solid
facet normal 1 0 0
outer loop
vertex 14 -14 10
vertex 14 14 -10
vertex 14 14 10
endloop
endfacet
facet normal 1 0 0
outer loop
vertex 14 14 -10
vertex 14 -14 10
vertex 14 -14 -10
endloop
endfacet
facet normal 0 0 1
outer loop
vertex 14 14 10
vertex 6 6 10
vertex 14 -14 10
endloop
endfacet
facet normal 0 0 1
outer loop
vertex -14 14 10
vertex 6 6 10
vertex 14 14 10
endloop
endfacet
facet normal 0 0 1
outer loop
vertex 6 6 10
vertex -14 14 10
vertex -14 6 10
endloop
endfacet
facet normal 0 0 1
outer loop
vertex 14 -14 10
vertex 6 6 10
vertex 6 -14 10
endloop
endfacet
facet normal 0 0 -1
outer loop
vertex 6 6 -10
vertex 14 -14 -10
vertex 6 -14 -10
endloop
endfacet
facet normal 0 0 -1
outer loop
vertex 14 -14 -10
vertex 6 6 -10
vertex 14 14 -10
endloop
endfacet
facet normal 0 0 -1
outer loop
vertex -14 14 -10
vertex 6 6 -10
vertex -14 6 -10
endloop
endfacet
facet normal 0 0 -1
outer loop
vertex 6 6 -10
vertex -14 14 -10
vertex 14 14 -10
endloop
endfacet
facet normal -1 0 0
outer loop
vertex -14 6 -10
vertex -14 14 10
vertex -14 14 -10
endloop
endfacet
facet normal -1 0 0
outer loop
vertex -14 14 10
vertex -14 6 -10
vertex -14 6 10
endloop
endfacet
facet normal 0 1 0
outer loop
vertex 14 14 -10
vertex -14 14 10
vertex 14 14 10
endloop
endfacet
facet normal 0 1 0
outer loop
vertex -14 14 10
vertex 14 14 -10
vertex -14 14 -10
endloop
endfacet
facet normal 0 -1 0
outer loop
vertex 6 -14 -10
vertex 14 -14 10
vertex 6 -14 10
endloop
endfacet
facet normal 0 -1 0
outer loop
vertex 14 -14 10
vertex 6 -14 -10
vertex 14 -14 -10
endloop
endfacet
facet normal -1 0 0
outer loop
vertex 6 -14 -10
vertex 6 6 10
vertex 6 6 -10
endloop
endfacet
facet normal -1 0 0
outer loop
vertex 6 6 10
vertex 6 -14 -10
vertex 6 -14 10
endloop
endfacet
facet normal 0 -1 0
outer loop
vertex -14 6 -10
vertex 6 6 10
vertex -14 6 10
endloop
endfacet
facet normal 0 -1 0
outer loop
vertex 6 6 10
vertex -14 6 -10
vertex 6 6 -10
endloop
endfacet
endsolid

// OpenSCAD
module extrusion_bracket() {
    difference() {
        cube([28, 28, 20], center = true);
        translate([-14, -14, -10])
            cube([20, 20, 20], center = false);
    }
}

extrusion_bracket();
